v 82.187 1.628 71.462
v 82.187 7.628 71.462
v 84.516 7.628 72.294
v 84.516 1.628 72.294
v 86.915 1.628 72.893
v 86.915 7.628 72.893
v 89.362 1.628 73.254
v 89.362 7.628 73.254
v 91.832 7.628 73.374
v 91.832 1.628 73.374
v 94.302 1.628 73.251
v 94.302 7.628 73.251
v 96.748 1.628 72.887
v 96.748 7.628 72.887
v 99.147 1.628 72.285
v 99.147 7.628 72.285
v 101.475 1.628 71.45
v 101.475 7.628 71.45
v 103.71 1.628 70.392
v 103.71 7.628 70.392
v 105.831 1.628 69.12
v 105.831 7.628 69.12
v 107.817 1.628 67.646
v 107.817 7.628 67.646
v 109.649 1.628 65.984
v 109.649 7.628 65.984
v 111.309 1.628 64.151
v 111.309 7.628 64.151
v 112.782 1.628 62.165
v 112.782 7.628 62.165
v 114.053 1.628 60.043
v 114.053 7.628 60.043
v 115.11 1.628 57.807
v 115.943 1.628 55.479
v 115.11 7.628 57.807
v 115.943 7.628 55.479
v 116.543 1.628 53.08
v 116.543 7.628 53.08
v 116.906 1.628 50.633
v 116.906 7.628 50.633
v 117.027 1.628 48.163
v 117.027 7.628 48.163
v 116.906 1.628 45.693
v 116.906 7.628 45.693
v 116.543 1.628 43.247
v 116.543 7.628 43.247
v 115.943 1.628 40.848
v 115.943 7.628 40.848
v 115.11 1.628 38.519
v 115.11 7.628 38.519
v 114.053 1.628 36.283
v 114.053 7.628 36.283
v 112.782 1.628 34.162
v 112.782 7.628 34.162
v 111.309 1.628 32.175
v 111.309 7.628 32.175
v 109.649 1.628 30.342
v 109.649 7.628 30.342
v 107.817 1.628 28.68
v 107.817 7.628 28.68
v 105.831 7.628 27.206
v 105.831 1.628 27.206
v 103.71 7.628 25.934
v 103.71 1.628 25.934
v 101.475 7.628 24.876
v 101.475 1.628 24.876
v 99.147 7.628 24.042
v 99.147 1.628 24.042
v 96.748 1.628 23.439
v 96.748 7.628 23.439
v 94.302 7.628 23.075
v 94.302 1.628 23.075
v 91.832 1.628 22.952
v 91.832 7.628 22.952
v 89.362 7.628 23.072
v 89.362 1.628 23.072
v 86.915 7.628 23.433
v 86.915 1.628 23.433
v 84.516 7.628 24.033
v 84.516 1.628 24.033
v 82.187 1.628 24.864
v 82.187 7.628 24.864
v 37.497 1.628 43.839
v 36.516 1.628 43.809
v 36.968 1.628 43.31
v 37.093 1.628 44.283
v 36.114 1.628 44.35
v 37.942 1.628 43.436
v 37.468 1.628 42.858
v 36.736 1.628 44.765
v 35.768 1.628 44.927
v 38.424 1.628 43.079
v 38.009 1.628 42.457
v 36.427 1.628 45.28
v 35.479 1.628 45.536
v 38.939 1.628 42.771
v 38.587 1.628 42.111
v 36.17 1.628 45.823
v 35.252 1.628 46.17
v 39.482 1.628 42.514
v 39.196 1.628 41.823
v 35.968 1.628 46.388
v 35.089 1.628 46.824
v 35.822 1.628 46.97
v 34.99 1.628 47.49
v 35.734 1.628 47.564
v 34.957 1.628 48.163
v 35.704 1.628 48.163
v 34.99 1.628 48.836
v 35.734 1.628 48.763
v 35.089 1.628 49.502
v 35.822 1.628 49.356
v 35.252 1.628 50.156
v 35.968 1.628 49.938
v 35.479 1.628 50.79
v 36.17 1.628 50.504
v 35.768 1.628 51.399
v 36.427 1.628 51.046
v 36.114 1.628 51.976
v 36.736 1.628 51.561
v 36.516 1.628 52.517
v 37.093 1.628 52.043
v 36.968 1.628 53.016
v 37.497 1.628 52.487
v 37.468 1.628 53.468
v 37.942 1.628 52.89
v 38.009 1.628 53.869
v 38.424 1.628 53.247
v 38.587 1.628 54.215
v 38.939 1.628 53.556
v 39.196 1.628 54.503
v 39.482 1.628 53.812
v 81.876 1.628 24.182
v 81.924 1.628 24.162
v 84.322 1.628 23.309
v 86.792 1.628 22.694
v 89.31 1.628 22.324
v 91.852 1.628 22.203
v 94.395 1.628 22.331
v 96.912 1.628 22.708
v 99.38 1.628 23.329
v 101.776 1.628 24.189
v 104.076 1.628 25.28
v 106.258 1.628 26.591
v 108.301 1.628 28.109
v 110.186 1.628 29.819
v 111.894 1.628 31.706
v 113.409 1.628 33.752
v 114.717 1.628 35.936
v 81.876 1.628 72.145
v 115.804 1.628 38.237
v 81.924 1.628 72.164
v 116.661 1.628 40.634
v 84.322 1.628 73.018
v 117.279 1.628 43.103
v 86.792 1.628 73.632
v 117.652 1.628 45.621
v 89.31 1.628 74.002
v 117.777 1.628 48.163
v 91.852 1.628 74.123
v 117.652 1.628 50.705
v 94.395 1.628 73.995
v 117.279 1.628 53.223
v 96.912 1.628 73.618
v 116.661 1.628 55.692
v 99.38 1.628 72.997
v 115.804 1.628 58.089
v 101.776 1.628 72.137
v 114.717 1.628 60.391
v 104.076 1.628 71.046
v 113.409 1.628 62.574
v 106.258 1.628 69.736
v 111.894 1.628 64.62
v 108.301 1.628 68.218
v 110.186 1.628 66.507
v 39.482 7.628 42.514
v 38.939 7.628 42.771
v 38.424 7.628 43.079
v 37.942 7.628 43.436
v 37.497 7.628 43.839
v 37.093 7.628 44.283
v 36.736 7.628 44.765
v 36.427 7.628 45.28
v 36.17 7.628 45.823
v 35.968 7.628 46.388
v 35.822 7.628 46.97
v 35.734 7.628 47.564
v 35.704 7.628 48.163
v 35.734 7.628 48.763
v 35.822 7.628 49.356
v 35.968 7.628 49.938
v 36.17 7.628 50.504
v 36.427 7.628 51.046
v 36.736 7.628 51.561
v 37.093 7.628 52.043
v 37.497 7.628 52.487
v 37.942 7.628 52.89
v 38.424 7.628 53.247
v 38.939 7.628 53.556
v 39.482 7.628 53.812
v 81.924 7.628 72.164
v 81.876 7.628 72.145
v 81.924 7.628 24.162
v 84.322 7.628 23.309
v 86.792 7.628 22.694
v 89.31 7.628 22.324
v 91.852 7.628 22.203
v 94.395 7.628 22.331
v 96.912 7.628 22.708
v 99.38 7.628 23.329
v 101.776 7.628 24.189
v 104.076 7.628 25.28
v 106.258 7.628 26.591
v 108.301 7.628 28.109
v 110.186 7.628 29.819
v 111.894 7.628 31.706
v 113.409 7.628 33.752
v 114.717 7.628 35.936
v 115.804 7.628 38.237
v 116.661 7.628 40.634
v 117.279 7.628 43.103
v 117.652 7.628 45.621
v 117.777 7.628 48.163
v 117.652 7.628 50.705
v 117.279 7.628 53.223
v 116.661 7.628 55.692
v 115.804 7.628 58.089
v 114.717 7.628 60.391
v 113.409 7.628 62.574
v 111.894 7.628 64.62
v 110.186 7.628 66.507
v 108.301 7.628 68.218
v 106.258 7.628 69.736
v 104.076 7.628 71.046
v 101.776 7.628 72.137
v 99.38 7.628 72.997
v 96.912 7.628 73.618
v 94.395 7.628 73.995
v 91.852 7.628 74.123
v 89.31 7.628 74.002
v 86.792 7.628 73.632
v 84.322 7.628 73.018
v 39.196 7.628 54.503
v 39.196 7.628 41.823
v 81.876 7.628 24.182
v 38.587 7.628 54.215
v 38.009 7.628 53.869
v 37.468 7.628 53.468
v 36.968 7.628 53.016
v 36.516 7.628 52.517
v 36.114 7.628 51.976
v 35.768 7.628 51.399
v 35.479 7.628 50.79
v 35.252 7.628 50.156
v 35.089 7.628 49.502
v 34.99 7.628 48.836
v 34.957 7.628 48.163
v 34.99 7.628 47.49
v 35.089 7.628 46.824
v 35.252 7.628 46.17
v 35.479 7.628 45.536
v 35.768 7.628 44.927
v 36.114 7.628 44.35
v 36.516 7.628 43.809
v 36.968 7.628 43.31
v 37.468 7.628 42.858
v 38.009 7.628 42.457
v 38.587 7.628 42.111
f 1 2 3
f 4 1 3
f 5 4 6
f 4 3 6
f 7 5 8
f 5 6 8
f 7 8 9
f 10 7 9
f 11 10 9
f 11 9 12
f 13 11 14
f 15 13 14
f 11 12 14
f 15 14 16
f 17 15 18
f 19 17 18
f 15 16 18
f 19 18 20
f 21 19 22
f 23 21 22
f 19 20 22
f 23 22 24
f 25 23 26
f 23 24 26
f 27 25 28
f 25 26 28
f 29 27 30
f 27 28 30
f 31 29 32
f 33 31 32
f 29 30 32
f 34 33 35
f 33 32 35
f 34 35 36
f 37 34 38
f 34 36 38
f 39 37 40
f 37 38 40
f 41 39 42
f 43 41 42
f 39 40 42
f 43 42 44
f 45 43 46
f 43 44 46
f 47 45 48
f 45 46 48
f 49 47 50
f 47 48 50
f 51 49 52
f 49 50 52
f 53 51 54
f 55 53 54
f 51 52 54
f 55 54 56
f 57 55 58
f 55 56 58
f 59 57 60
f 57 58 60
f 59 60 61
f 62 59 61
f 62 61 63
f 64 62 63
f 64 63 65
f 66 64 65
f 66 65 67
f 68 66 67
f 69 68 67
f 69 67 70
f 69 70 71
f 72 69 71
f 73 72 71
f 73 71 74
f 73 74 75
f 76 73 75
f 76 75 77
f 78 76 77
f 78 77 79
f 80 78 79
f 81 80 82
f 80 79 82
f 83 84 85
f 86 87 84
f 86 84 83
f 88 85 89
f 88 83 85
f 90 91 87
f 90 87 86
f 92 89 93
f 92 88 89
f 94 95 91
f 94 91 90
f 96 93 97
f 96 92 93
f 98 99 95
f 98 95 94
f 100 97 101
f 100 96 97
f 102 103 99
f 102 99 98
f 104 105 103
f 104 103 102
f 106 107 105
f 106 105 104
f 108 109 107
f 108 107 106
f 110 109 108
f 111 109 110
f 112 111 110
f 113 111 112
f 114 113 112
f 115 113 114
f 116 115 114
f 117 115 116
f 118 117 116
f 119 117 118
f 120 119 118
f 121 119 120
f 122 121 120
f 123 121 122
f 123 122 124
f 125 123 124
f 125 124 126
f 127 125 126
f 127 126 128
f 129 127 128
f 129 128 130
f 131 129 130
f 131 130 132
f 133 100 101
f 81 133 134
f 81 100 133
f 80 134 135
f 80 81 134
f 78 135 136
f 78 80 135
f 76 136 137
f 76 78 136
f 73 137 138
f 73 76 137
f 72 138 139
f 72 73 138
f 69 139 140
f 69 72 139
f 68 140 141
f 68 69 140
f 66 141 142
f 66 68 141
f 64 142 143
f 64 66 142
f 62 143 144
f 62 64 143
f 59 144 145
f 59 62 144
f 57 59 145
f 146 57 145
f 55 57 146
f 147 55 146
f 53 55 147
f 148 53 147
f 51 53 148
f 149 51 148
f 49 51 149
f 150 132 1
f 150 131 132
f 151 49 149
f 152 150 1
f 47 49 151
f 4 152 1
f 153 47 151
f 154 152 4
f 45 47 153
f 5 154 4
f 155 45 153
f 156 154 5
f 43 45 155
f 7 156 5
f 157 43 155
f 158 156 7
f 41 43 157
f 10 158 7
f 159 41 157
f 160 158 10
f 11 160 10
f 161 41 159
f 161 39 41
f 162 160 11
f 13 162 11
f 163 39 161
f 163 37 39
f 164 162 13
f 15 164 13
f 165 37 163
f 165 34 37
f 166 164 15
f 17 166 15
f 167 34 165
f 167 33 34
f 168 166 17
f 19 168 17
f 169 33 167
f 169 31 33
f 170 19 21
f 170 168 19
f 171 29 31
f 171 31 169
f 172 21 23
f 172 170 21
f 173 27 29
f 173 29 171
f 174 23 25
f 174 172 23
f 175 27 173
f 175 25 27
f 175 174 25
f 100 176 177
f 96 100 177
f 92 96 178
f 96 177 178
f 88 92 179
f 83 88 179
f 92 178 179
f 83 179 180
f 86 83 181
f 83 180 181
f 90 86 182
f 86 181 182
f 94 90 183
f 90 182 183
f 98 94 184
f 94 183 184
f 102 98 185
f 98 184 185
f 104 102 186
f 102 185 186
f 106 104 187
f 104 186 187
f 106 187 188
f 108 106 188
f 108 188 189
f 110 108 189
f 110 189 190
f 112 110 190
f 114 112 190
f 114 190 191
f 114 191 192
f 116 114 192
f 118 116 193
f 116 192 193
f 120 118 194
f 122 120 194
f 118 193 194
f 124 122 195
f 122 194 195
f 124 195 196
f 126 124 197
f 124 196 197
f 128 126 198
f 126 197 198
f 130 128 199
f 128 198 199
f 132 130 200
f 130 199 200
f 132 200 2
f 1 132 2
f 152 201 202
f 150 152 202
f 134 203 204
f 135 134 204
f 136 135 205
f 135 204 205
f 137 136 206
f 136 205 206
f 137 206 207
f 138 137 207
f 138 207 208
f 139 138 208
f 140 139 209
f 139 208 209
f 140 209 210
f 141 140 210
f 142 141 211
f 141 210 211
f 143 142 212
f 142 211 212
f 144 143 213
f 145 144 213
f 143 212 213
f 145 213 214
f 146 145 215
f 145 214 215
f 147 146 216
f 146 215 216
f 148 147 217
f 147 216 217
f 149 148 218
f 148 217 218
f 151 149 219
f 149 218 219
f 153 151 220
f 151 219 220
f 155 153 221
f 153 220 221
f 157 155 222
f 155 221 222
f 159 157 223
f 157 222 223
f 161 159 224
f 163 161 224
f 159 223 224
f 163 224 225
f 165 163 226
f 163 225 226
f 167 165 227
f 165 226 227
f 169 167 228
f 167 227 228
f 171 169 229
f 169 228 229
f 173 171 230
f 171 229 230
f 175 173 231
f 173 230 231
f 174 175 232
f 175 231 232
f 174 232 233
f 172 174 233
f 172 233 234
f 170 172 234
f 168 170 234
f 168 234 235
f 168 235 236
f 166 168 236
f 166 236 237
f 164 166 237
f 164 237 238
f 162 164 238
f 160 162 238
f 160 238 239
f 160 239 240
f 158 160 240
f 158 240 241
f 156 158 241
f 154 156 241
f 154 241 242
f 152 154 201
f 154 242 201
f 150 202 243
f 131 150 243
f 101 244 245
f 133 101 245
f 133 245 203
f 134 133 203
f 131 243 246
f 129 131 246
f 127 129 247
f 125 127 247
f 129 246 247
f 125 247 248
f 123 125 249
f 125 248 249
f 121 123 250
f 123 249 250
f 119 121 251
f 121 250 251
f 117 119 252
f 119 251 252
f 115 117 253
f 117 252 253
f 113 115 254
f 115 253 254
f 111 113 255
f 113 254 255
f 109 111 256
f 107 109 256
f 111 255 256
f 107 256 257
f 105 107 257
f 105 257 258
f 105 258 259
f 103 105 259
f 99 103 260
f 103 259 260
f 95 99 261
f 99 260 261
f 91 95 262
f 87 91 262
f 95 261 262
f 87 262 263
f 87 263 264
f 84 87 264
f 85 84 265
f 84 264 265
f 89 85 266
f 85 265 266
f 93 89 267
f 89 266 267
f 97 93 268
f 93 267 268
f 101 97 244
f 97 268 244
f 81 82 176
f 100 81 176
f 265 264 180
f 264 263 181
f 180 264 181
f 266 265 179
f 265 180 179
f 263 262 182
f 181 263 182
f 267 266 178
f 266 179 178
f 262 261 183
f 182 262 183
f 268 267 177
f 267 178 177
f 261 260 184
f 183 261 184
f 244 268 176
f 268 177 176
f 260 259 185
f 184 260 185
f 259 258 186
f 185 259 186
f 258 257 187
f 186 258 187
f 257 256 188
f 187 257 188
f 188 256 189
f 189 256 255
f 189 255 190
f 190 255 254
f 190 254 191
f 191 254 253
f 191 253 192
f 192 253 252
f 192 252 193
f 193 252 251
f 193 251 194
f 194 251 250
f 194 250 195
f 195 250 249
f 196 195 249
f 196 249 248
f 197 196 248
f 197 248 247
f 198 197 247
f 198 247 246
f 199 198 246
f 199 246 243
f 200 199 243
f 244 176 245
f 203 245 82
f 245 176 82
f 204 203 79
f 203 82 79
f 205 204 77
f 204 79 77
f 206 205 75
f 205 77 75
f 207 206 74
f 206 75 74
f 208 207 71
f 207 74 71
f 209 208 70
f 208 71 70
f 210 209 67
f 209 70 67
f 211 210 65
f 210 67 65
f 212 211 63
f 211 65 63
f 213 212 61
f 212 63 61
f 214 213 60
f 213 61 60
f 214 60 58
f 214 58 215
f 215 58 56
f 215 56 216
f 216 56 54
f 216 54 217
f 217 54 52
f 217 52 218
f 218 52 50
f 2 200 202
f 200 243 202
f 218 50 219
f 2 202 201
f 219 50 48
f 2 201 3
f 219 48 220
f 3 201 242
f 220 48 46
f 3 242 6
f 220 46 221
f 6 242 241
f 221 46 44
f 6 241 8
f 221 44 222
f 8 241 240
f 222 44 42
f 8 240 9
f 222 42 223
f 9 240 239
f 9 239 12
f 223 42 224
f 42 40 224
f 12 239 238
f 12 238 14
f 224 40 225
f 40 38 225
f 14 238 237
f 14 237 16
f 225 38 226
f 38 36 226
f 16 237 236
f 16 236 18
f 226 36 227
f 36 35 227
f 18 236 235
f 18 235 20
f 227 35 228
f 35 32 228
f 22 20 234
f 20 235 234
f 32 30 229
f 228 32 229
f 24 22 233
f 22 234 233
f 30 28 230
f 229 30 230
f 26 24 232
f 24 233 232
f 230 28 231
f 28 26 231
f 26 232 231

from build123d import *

# Parameters (mm, degrees)
BOSS_EXTRUDE1_DEPTH = 6


with BuildPart() as part:
    # Sketch1 → Boss-Extrude1 (new body)
    with BuildSketch(Plane.XZ.offset(-7.628326304)):
        with BuildLine():
            Line((81.876098577, 72.144512579), (39.196222867, 54.502914987))
            ThreePointArc((39.196222867, 54.502914987), (34.956549827, 48.163081659), (39.196222867, 41.823248331))
            Line((39.196222867, 41.823248331), (81.876098577, 24.18165074))
            Line((81.876098577, 24.18165074), (81.923583987, 24.162022789))
            ThreePointArc((81.923583987, 24.162022789), (117.776549827, 48.163081659), (81.923583987, 72.164140529))
            Line((81.923583987, 72.164140529), (81.876098577, 72.144512579))
        make_face()
        with BuildLine():
            Line((82.186737097, 24.863925245), (39.481862188, 42.514347463))
            ThreePointArc((39.481862188, 42.514347463), (35.704351827, 48.163081659), (39.481862188, 53.811815856))
            Line((39.481862188, 53.811815856), (82.186737097, 71.462238074))
            ThreePointArc((82.186737097, 71.462238074), (117.027340827, 48.163081659), (82.186737097, 24.863925245))
        make_face(mode=Mode.SUBTRACT)
    extrude(amount=BOSS_EXTRUDE1_DEPTH)


solid = part.part
